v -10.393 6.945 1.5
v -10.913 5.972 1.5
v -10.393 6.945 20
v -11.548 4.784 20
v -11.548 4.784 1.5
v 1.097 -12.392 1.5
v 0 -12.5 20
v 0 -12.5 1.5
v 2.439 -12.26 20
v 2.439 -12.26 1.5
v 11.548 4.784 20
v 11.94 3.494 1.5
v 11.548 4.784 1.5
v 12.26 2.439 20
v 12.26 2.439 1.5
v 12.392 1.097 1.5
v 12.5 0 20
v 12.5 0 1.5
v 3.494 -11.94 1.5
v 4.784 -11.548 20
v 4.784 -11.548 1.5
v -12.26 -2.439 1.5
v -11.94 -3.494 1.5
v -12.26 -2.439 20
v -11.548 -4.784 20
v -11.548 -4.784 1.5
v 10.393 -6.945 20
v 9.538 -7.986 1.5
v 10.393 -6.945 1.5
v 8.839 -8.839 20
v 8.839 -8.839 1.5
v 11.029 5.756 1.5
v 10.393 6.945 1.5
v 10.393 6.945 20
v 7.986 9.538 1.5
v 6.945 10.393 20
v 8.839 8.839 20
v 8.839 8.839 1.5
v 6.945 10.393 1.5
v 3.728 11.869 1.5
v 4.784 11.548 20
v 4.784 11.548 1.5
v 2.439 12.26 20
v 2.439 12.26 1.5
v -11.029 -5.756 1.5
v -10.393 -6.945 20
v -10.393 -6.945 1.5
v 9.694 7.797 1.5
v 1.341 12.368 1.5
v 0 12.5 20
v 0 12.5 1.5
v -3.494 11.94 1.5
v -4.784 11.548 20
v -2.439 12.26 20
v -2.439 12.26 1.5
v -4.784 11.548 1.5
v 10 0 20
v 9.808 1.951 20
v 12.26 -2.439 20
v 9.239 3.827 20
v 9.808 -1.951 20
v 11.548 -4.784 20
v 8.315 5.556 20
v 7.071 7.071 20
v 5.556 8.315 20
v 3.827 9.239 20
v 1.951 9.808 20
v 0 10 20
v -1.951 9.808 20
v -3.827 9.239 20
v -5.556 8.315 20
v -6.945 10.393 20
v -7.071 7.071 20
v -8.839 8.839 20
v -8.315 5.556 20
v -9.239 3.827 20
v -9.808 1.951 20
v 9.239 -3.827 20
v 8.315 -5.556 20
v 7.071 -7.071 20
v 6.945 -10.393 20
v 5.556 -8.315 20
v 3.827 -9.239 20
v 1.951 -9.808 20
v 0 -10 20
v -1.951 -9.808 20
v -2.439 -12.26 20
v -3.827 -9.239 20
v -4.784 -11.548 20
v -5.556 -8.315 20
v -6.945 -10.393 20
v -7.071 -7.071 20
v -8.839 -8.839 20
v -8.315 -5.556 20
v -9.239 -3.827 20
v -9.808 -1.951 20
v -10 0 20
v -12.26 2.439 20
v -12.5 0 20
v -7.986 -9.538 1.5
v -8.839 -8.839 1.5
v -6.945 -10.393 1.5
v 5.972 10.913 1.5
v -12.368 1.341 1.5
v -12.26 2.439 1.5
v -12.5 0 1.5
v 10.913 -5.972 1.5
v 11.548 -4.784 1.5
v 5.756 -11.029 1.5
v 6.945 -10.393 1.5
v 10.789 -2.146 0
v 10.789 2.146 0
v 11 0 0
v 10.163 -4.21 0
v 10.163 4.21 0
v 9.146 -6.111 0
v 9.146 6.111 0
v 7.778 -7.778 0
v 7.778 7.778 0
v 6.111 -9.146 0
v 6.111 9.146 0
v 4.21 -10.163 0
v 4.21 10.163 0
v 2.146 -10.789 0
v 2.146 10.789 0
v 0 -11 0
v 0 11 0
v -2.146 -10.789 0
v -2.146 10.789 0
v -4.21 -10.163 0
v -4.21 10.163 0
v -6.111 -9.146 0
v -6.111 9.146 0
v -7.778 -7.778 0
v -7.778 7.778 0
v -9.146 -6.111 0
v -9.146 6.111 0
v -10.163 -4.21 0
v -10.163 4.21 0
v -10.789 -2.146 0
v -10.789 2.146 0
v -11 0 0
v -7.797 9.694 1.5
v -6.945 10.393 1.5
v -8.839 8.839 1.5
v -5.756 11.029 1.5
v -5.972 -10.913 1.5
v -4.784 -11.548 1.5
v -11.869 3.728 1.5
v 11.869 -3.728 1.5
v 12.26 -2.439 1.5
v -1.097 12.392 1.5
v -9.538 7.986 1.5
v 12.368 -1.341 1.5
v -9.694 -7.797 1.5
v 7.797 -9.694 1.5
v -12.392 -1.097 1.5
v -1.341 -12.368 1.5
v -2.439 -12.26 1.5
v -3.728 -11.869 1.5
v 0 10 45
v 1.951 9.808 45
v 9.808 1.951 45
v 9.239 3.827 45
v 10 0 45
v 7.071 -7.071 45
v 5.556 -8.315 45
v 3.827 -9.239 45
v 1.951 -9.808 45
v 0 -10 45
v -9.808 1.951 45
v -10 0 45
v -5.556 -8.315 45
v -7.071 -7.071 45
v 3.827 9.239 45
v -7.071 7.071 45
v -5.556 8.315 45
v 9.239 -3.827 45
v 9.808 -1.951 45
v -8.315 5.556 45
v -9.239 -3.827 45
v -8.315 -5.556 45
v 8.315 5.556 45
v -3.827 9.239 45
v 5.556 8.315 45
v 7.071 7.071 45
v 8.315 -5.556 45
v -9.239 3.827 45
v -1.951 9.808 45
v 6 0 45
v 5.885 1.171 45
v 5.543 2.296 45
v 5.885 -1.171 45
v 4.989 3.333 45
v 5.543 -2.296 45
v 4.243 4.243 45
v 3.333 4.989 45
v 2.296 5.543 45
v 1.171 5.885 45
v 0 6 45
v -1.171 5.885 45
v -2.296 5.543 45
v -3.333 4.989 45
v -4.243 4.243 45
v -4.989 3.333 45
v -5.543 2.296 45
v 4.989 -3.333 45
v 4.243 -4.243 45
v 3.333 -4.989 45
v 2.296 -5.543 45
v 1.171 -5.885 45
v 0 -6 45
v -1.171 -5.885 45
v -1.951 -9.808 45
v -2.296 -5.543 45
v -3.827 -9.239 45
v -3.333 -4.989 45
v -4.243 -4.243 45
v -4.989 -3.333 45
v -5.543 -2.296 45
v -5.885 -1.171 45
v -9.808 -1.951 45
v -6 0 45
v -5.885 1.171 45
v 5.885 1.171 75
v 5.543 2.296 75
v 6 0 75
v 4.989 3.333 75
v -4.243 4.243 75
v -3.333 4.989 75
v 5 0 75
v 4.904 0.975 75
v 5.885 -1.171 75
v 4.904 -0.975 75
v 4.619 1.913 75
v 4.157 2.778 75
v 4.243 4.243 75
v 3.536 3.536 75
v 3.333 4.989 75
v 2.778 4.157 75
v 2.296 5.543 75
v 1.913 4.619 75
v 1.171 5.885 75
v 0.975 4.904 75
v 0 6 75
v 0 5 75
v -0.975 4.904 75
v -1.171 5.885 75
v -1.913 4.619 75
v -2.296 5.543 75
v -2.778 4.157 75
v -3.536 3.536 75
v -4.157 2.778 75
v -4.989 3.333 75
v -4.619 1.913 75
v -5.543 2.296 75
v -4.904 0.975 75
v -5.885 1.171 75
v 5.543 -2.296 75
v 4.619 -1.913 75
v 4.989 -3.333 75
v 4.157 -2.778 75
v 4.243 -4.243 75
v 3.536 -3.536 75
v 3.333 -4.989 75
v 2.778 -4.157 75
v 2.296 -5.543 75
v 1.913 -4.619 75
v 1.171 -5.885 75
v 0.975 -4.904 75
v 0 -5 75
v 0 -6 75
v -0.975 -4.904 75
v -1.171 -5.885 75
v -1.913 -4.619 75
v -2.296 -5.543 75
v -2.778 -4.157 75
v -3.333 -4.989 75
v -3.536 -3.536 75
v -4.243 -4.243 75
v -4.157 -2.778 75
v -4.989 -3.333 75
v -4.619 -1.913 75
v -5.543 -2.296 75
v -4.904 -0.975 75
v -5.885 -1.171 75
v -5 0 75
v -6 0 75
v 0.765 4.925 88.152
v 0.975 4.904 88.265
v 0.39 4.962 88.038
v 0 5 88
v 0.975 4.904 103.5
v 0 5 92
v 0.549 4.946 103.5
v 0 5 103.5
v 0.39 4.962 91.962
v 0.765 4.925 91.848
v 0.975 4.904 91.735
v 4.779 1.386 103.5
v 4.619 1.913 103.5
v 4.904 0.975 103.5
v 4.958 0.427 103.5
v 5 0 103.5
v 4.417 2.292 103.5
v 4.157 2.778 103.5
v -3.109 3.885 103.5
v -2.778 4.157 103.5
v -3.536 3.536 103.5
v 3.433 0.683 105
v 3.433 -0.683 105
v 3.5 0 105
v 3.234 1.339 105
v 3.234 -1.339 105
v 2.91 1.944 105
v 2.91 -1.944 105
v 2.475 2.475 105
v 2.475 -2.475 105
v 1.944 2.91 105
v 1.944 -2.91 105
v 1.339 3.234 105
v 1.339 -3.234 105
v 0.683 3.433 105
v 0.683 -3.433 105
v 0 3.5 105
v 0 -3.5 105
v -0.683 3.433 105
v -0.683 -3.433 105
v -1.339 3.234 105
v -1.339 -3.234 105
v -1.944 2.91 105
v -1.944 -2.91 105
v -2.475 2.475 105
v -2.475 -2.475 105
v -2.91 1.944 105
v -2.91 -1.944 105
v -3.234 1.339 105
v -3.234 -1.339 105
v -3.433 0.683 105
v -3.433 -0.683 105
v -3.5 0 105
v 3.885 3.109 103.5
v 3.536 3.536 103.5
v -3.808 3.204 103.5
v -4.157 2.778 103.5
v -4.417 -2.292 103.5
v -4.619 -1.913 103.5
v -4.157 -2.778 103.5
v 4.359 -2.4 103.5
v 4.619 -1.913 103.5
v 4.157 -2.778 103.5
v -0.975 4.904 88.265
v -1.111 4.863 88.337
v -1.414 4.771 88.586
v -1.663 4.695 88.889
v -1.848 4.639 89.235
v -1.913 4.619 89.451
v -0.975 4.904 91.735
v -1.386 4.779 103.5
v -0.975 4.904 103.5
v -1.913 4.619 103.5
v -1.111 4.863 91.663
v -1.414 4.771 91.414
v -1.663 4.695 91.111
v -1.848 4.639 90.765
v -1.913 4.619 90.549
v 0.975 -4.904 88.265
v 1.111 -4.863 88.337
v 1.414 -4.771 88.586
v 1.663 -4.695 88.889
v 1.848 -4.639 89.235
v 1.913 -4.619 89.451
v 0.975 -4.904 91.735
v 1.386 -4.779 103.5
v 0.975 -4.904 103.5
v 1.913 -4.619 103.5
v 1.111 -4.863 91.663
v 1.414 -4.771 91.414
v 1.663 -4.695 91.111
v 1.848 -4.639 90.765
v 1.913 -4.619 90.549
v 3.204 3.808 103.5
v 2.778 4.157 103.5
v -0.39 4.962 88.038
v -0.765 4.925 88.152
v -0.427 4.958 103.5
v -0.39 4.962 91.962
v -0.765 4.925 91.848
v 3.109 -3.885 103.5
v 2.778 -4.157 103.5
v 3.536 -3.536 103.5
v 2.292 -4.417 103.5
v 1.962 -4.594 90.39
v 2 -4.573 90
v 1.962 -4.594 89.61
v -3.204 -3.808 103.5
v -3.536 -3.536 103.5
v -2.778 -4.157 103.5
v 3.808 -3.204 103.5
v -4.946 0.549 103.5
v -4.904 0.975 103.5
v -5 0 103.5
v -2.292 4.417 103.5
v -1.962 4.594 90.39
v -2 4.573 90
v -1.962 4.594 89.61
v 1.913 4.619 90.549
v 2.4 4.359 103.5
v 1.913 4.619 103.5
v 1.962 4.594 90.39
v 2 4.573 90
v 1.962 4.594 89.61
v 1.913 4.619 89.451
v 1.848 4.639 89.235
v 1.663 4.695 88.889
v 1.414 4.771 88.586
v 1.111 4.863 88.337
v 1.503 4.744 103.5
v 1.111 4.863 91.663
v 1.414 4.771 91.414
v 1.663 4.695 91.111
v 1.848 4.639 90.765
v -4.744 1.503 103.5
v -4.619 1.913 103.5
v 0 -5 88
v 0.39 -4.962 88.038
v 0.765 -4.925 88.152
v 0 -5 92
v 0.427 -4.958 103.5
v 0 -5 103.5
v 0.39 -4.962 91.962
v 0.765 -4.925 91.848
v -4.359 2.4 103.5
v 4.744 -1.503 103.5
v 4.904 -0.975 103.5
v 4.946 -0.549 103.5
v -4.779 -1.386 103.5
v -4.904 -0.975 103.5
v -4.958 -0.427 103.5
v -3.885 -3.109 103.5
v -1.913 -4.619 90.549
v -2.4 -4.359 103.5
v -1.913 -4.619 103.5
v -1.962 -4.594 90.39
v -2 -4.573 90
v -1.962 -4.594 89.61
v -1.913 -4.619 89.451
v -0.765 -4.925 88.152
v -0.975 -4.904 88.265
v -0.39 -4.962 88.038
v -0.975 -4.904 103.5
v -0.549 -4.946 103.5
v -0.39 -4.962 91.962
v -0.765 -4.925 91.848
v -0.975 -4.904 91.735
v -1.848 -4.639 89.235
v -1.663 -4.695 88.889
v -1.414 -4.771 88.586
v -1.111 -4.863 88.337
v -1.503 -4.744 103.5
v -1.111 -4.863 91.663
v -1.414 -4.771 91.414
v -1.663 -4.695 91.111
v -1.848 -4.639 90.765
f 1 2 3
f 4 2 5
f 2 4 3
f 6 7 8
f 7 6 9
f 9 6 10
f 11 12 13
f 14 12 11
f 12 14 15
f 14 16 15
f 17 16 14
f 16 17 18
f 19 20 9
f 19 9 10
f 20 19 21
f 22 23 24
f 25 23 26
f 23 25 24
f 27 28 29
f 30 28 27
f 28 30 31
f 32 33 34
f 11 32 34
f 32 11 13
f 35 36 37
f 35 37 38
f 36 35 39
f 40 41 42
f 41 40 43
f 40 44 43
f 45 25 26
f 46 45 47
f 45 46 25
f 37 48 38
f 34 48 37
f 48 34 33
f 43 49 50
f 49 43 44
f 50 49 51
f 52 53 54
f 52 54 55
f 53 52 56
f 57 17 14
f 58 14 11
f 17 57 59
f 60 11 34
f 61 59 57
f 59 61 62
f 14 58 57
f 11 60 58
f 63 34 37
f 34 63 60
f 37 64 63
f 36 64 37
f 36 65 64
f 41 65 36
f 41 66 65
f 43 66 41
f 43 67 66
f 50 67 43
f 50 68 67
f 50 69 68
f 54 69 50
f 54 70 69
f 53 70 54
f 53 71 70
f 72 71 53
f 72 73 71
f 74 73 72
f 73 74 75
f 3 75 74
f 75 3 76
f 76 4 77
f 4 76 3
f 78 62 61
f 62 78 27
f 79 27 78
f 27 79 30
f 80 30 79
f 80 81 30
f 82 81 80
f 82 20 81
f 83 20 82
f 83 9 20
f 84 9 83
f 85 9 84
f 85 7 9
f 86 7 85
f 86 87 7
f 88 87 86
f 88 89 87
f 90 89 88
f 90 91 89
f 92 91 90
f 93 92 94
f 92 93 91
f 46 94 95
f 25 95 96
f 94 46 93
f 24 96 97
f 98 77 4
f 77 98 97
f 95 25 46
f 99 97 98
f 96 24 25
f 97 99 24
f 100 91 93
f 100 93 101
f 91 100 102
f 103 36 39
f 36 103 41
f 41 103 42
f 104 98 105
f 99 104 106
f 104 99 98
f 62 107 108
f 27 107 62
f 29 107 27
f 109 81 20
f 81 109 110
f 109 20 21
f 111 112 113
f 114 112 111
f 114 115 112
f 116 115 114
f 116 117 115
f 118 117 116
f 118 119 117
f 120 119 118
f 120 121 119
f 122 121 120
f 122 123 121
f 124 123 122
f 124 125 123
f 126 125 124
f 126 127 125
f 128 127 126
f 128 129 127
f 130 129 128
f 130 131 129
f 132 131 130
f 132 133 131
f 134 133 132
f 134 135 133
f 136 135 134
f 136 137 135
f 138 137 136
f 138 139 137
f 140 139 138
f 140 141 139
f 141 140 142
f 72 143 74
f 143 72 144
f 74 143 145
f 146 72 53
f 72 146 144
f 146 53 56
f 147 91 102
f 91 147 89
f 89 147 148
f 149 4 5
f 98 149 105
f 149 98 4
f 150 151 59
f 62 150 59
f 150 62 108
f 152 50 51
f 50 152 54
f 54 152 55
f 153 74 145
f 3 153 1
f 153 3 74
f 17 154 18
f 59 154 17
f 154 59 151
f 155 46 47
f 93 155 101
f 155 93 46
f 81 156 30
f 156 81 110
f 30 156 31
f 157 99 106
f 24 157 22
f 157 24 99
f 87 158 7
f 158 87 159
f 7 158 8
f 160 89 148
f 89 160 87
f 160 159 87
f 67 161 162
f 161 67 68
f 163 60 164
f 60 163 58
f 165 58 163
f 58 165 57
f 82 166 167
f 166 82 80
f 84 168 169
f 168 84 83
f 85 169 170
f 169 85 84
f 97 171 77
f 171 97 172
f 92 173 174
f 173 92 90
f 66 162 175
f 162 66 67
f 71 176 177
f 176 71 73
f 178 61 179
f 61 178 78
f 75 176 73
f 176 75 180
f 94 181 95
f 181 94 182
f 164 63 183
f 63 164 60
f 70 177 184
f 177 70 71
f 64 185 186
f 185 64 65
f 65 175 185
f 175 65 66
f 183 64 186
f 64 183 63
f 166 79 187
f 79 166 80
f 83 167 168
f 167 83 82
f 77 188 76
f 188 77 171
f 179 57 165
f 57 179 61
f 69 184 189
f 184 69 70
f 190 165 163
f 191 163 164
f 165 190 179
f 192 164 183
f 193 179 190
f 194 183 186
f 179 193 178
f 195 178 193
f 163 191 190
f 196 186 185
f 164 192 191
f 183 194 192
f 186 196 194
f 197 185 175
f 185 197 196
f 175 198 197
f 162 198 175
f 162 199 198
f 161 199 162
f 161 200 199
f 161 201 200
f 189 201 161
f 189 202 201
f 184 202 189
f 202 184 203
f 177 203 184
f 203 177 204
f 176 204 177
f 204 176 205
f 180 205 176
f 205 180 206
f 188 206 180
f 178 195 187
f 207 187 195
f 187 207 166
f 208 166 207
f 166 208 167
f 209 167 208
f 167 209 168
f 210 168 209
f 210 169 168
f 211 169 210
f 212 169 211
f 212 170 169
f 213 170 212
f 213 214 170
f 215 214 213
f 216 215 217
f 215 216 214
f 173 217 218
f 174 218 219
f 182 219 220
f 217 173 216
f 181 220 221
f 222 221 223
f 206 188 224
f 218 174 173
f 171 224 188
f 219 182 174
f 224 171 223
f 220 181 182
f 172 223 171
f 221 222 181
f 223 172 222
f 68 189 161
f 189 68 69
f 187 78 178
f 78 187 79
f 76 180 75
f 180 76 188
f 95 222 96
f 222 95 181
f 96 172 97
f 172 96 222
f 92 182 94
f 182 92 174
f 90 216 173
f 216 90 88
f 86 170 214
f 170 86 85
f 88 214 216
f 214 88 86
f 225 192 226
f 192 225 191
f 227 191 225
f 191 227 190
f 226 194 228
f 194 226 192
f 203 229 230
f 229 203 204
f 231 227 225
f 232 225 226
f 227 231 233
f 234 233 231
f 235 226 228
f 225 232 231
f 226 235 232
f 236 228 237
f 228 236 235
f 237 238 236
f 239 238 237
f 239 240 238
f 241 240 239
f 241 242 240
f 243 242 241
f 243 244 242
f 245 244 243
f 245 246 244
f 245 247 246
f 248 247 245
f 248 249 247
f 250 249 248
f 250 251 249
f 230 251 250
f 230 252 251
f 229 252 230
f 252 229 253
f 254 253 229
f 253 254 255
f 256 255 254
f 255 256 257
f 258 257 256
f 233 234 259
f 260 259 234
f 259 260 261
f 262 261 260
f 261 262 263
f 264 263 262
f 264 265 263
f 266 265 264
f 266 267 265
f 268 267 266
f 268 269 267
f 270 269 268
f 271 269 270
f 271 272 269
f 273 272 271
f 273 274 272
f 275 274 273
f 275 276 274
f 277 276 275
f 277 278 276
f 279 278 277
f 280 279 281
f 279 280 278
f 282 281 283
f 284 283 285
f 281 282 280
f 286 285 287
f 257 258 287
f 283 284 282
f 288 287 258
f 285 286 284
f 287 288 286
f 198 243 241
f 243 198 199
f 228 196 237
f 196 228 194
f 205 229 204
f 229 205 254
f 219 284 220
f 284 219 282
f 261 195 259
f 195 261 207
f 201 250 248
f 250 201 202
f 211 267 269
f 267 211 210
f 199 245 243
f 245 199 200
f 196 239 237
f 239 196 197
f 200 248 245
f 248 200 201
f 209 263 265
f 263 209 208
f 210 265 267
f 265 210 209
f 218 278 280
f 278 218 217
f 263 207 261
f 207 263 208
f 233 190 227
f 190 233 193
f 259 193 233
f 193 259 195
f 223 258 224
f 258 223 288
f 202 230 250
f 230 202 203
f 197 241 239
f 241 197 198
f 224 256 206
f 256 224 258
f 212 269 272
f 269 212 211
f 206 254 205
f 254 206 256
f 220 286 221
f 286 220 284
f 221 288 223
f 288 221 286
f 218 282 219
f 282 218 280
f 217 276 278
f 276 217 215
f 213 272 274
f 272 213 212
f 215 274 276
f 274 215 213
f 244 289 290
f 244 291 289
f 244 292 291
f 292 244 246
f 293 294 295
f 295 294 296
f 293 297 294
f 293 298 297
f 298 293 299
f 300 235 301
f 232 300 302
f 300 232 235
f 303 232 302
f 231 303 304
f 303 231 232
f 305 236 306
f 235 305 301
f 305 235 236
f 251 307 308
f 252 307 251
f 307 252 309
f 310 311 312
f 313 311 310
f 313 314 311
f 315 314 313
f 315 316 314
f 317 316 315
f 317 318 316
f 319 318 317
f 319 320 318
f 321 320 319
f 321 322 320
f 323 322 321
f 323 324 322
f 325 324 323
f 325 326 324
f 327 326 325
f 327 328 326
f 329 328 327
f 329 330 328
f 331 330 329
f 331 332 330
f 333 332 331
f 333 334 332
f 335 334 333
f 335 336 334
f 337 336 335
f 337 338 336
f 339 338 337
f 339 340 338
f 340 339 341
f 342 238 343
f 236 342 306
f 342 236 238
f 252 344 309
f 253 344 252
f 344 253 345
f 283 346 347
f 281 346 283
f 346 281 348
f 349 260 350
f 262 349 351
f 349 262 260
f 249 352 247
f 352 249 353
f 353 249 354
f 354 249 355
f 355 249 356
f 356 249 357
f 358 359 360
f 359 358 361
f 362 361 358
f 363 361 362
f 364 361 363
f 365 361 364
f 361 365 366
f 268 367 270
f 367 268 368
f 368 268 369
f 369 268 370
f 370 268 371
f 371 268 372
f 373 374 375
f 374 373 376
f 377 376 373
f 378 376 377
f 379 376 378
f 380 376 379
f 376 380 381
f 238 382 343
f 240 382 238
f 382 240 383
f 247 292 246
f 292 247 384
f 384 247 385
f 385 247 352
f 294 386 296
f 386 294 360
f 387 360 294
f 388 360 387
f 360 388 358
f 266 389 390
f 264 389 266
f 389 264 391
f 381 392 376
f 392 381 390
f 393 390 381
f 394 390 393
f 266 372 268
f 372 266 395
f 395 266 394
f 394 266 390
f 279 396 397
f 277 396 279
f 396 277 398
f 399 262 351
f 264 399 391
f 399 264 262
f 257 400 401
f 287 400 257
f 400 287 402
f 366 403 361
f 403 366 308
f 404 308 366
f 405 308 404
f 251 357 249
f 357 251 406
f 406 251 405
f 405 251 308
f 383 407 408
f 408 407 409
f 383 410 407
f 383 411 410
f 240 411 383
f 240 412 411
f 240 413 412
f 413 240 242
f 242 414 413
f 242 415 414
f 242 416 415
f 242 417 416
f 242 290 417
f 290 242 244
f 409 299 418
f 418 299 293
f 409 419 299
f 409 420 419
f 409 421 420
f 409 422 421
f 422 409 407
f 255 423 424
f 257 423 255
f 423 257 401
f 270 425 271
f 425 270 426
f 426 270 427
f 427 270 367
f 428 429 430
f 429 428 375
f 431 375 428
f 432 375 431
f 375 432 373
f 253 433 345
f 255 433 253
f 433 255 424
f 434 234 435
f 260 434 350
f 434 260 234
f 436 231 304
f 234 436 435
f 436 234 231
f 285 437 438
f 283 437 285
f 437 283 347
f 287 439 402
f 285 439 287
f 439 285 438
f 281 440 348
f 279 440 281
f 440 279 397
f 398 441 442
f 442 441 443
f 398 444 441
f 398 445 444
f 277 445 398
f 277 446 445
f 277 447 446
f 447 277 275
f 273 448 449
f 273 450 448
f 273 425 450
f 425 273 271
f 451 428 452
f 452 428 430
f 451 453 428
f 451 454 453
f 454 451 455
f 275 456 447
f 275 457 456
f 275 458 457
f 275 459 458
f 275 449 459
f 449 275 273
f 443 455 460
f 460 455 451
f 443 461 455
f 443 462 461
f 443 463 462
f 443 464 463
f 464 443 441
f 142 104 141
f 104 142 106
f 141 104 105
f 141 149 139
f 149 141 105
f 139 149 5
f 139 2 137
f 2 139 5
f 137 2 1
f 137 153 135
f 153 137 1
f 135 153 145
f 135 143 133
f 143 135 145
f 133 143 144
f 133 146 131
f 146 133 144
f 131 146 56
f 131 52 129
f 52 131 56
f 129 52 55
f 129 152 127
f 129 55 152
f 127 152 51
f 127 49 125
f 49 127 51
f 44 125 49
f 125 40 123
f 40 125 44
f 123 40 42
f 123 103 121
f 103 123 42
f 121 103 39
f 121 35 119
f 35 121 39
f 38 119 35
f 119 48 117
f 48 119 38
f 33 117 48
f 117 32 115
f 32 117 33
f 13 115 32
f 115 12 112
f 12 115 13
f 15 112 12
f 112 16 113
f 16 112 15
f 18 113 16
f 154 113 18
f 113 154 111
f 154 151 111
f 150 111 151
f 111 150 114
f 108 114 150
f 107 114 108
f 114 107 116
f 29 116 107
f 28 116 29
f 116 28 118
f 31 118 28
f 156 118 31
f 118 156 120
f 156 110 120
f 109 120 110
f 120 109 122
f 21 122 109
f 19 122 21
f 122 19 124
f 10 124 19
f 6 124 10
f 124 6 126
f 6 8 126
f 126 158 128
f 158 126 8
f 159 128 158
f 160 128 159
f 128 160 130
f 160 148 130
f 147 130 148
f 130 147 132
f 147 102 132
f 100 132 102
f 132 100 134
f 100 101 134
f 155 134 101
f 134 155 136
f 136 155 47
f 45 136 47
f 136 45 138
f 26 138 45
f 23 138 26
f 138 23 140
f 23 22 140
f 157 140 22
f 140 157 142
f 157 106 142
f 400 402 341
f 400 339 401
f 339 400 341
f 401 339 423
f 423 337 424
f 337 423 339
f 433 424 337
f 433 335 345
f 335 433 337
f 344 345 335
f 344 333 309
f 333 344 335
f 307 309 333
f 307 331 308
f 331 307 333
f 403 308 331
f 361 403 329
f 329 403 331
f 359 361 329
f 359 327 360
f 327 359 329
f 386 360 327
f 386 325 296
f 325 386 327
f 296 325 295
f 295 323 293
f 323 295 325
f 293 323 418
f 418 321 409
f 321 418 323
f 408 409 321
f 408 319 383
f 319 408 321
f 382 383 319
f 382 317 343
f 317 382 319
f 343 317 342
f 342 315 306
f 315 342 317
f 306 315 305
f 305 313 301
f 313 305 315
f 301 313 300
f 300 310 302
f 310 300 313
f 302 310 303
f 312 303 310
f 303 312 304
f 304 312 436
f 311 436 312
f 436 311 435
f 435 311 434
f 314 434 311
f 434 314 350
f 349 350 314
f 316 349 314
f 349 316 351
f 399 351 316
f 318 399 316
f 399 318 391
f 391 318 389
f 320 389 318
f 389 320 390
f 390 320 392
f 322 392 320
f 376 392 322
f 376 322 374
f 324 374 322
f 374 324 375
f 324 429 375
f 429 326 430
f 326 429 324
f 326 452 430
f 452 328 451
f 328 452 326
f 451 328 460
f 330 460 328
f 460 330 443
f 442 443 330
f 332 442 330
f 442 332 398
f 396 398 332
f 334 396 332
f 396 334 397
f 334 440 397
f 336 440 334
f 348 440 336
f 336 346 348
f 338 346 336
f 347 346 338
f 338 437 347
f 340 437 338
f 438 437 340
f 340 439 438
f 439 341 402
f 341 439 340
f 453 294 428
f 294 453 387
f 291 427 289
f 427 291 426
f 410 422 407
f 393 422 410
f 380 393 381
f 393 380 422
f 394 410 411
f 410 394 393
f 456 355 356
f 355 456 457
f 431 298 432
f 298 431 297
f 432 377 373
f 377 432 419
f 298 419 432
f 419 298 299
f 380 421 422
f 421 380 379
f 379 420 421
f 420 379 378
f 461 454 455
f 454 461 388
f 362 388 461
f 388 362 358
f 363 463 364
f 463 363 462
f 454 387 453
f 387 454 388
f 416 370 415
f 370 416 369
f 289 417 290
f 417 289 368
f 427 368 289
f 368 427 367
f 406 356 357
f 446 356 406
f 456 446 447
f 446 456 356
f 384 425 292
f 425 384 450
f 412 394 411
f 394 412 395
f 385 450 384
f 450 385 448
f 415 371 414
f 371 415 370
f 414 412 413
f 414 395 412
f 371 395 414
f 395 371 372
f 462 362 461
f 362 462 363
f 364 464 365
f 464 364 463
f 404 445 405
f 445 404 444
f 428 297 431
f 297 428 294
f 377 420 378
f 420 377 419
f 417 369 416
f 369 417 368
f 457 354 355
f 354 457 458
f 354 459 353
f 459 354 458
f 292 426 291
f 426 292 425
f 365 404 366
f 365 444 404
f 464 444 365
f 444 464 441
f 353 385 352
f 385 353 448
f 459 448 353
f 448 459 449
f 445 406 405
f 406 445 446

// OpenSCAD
$fn = 32;

// ----------------------------------------------------------------------
// Stepped shaft: diameters 25, 20, 12, 10 mm, 105 mm long
// ----------------------------------------------------------------------

// --- parameters (mm) ---
d1 = 25;                  // step 1 diameter
len1 = 20;                // step 1 length
d2 = 20;                  // step 2 diameter
len2 = 25;                // step 2 length
d3 = 12;                  // step 3 diameter
len3 = 30;                // step 3 length
d4 = 10;                  // step 4 diameter
len4 = 30;                // step 4 length
total = 105;              // overall length
chamfer = 1.5;            // end chamfer
cross_d = 4;              // cross pin hole
cross_z = 90;             // cross hole position

difference() {
  /* turned body: stacked cylinders, every step sunk into the bigger one */
  union() {
    cylinder(h = len1, d = d1);
    translate([0, 0, 19.6]) cylinder(h = 25.4, d = d2);
    translate([0, 0, 44.6]) cylinder(h = 30.4, d = d3);
    translate([0, 0, 74.6]) cylinder(h = 30.4, d = d4);
  }
  /* bottom chamfer ring cut */
  rotate_extrude() translate([11, -2.5]) polygon([[0, 0], [4, 0], [4, 6.5], [0, 2.5]]);
  /* top chamfer ring cut */
  rotate_extrude() translate([3.5, 105]) polygon([[0, 0], [4, -4], [4, 2.5], [0, 2.5]]);
  /* cross pin hole through the small step */
  translate([0, 0, cross_z]) rotate([90, 0, 0]) cylinder(h = d4 + 5, d = cross_d, center = true);
}
